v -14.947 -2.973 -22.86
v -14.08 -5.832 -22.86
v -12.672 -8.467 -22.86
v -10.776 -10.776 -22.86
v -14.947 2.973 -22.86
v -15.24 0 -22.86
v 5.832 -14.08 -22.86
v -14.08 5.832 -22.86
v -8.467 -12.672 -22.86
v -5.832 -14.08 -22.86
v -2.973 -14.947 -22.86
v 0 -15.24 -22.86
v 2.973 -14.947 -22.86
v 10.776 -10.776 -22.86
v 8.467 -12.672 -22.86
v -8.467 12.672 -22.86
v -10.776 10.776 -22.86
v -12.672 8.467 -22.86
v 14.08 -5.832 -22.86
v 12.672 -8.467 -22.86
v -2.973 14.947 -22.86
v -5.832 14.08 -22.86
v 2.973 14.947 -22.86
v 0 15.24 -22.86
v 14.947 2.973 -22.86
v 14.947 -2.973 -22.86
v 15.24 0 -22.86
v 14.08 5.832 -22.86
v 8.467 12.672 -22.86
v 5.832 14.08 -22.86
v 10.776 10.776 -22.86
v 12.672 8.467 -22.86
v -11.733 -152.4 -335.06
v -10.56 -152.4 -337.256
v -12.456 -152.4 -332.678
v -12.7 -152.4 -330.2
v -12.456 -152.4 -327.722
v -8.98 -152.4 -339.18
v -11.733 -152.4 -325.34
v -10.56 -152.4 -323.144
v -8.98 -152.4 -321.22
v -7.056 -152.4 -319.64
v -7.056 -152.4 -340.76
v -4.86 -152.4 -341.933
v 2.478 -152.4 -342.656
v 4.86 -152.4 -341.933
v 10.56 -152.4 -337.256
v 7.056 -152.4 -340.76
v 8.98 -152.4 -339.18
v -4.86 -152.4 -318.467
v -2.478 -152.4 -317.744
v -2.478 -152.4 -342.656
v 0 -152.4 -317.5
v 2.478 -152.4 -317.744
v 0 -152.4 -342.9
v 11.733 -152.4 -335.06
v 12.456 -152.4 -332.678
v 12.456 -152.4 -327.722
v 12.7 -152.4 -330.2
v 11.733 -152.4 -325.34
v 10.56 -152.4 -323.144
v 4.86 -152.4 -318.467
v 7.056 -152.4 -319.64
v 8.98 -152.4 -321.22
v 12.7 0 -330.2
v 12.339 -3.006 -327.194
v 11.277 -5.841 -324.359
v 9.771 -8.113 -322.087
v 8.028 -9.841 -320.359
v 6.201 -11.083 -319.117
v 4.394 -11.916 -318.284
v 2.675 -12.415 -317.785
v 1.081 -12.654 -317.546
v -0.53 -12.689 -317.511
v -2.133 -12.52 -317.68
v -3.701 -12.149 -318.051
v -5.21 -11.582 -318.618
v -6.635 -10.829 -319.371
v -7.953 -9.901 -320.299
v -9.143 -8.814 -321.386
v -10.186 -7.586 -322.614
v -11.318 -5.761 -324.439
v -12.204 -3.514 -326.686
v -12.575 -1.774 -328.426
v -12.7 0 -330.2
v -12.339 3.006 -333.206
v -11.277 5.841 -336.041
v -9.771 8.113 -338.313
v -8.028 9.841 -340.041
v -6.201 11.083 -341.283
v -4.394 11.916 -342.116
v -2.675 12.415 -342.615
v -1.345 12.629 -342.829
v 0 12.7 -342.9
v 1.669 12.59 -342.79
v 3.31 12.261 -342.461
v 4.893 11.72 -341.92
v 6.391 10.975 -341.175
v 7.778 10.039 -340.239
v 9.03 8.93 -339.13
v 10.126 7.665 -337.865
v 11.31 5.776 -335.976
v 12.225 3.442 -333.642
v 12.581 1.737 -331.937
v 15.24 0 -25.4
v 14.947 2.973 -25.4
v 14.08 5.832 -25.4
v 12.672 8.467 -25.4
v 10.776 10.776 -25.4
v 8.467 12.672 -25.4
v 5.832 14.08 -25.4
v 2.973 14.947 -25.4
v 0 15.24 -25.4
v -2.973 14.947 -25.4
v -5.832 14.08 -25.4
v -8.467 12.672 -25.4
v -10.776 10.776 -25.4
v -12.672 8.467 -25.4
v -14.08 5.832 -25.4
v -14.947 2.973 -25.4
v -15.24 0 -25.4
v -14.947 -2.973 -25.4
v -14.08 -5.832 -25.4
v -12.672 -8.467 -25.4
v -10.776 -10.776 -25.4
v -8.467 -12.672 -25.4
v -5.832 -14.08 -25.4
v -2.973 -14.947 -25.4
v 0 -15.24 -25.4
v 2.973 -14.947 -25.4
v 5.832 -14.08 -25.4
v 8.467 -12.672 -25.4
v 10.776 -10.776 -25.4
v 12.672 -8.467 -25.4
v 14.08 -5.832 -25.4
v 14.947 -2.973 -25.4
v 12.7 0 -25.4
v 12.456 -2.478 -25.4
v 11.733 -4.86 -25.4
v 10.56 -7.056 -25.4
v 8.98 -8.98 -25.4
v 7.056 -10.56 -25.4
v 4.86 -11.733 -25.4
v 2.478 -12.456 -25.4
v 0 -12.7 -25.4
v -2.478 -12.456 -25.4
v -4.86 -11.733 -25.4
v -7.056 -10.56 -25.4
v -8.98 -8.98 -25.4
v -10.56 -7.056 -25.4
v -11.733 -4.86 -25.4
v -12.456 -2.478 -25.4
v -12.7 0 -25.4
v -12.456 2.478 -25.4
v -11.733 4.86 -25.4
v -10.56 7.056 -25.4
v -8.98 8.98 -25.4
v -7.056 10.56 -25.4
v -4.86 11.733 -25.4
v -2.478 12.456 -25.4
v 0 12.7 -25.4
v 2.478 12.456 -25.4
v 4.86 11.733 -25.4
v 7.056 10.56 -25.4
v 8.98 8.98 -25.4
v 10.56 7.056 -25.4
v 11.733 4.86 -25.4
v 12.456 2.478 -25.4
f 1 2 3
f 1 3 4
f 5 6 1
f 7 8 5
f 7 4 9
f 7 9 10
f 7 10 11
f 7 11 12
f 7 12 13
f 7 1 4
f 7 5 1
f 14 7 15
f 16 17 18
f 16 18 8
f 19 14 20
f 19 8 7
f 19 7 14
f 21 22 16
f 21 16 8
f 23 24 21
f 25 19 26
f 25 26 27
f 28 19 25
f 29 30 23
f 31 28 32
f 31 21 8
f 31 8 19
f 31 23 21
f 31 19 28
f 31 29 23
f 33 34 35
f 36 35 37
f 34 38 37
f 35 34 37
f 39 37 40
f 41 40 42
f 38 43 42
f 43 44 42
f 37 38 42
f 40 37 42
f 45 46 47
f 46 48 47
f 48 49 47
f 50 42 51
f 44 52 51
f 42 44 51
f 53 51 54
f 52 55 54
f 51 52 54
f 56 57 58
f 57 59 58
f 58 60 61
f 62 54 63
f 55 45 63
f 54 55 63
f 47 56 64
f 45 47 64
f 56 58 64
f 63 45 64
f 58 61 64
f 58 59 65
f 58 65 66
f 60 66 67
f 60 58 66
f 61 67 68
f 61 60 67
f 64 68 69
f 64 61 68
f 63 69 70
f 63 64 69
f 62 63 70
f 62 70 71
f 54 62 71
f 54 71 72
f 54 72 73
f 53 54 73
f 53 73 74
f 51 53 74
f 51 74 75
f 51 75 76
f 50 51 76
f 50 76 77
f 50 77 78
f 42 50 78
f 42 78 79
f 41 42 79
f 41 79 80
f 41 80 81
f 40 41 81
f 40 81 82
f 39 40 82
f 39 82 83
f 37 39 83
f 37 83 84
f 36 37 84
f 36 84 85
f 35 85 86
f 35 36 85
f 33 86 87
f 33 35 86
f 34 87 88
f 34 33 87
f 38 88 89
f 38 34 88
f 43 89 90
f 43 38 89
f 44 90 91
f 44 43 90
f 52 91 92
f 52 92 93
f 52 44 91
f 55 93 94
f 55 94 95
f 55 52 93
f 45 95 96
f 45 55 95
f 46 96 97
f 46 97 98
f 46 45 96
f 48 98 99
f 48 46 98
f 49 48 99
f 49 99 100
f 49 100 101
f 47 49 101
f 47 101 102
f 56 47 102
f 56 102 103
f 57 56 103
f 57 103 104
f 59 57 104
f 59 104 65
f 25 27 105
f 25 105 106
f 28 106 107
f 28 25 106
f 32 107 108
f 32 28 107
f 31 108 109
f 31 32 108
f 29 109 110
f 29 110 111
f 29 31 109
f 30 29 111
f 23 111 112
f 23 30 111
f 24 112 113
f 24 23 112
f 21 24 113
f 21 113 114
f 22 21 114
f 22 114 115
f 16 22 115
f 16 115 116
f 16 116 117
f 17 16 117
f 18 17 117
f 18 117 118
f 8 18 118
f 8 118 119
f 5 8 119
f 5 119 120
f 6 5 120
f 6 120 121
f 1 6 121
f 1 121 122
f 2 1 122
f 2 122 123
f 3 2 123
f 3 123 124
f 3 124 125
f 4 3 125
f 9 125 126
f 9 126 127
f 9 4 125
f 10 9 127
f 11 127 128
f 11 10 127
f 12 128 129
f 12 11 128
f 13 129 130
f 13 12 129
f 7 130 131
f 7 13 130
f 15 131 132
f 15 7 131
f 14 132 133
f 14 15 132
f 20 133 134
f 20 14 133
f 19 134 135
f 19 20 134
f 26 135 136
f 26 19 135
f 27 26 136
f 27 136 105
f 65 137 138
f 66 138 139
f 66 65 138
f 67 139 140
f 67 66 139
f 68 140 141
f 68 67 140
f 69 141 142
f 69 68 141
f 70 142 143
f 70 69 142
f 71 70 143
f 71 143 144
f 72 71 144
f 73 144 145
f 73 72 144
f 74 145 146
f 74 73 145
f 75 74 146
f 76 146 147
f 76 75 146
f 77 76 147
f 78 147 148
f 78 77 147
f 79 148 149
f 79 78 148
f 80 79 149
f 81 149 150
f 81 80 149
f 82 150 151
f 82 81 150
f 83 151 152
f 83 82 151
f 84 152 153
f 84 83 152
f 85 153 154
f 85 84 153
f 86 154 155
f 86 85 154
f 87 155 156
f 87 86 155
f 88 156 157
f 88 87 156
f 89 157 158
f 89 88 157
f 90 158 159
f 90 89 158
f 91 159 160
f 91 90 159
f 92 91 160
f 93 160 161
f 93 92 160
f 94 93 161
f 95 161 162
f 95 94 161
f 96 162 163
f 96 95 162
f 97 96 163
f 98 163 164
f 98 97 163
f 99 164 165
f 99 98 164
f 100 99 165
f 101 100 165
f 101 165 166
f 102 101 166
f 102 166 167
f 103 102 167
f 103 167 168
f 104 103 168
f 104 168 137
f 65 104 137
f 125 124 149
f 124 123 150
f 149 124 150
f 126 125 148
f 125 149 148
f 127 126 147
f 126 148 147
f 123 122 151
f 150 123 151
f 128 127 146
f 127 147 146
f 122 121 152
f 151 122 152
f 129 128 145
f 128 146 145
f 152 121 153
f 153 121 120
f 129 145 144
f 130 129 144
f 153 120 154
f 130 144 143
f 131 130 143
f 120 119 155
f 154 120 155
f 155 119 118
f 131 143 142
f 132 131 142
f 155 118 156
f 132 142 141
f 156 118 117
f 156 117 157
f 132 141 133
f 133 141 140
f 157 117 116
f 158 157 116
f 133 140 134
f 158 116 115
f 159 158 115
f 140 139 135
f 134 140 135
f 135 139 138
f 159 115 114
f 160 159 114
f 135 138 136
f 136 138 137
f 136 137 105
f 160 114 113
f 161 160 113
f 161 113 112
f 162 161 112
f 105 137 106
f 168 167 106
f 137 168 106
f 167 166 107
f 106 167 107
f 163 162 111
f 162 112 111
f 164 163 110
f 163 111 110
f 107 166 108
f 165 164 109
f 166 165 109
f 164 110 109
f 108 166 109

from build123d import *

# Parameters (mm, degrees)
SKETCH2_R           = 12.7
SKETCH6_R           = 15.24
BOSS_EXTRUDE2_DEPTH = 25.4
SKETCH7_R           = 15.24
CUT_EXTRUDE1_DEPTH  = 22.86


with BuildPart() as part:
    # Sweep1: sweep along a path in Sketch1
    with BuildLine(Plane(origin=(0, 0, 0), x_dir=(0, 0, -1), z_dir=(1, 0, 0))) as sweep1_path:
        Line((0, 0), (330.2, 0))
        Line((330.2, 0), (330.2, -152.4))
    # Sketch2 → Sweep1 (sweep)
    with BuildSketch(Plane.XY):
        Circle(SKETCH2_R)
    sweep(path=sweep1_path.line, transition=Transition.RIGHT)

    # Sketch6 → Boss-Extrude2 (add)
    with BuildSketch(Plane.XY):
        Circle(SKETCH6_R)
    extrude(amount=-BOSS_EXTRUDE2_DEPTH)

    # Sketch7 → Cut-Extrude1 (cut)
    with BuildSketch(Plane.XY):
        Circle(SKETCH7_R)
    extrude(amount=-CUT_EXTRUDE1_DEPTH, mode=Mode.SUBTRACT)


solid = part.part
